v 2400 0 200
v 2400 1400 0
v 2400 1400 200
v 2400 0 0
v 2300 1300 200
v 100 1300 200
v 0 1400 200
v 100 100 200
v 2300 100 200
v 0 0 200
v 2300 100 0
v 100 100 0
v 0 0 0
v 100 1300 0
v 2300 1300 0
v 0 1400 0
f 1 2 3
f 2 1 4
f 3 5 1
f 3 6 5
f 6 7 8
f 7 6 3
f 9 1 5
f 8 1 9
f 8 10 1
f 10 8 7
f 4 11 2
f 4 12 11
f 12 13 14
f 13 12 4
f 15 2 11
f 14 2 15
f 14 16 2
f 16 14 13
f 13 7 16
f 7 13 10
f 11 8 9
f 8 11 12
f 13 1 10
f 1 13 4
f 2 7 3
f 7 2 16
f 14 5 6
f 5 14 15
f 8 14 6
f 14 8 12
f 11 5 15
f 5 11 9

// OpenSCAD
// Generated from plan.json; millimetres. Not a structural design.
// Open in OpenSCAD. Increase explode_mm to inspect courses.
explode_mm = 0;
$fn = 24;
show_fixing_paths = false;

// first-bed-01-C1-S
translate([0, 0, 0+0*explode_mm])
  color([0.70,0.52,0.33]) cube([2400, 100, 200]);
// first-bed-01-C1-N
translate([0, 1300, 0+0*explode_mm])
  color([0.70,0.52,0.33]) cube([2400, 100, 200]);
// first-bed-01-C1-W
translate([0, 100, 0+0*explode_mm])
  color([0.70,0.52,0.33]) cube([100, 1200, 200]);
// first-bed-01-C1-E
translate([2300, 100, 0+0*explode_mm])
  color([0.70,0.52,0.33]) cube([100, 1200, 200]);
if (show_fixing_paths) translate([50.0, 1400, 50.0+0*explode_mm]) rotate([90,0,0]) color([0.8,0.1,0.1]) cylinder(d=7, h=150);
if (show_fixing_paths) translate([50.0, 1400, 150.0+0*explode_mm]) rotate([90,0,0]) color([0.8,0.1,0.1]) cylinder(d=7, h=150);
if (show_fixing_paths) translate([2350.0, 1400, 50.0+0*explode_mm]) rotate([90,0,0]) color([0.8,0.1,0.1]) cylinder(d=7, h=150);
if (show_fixing_paths) translate([2350.0, 1400, 150.0+0*explode_mm]) rotate([90,0,0]) color([0.8,0.1,0.1]) cylinder(d=7, h=150);
if (show_fixing_paths) translate([50.0, 0, 50.0+0*explode_mm]) rotate([-90,0,0]) color([0.8,0.1,0.1]) cylinder(d=7, h=150);
if (show_fixing_paths) translate([50.0, 0, 150.0+0*explode_mm]) rotate([-90,0,0]) color([0.8,0.1,0.1]) cylinder(d=7, h=150);
if (show_fixing_paths) translate([2350.0, 0, 50.0+0*explode_mm]) rotate([-90,0,0]) color([0.8,0.1,0.1]) cylinder(d=7, h=150);
if (show_fixing_paths) translate([2350.0, 0, 150.0+0*explode_mm]) rotate([-90,0,0]) color([0.8,0.1,0.1]) cylinder(d=7, h=150);
